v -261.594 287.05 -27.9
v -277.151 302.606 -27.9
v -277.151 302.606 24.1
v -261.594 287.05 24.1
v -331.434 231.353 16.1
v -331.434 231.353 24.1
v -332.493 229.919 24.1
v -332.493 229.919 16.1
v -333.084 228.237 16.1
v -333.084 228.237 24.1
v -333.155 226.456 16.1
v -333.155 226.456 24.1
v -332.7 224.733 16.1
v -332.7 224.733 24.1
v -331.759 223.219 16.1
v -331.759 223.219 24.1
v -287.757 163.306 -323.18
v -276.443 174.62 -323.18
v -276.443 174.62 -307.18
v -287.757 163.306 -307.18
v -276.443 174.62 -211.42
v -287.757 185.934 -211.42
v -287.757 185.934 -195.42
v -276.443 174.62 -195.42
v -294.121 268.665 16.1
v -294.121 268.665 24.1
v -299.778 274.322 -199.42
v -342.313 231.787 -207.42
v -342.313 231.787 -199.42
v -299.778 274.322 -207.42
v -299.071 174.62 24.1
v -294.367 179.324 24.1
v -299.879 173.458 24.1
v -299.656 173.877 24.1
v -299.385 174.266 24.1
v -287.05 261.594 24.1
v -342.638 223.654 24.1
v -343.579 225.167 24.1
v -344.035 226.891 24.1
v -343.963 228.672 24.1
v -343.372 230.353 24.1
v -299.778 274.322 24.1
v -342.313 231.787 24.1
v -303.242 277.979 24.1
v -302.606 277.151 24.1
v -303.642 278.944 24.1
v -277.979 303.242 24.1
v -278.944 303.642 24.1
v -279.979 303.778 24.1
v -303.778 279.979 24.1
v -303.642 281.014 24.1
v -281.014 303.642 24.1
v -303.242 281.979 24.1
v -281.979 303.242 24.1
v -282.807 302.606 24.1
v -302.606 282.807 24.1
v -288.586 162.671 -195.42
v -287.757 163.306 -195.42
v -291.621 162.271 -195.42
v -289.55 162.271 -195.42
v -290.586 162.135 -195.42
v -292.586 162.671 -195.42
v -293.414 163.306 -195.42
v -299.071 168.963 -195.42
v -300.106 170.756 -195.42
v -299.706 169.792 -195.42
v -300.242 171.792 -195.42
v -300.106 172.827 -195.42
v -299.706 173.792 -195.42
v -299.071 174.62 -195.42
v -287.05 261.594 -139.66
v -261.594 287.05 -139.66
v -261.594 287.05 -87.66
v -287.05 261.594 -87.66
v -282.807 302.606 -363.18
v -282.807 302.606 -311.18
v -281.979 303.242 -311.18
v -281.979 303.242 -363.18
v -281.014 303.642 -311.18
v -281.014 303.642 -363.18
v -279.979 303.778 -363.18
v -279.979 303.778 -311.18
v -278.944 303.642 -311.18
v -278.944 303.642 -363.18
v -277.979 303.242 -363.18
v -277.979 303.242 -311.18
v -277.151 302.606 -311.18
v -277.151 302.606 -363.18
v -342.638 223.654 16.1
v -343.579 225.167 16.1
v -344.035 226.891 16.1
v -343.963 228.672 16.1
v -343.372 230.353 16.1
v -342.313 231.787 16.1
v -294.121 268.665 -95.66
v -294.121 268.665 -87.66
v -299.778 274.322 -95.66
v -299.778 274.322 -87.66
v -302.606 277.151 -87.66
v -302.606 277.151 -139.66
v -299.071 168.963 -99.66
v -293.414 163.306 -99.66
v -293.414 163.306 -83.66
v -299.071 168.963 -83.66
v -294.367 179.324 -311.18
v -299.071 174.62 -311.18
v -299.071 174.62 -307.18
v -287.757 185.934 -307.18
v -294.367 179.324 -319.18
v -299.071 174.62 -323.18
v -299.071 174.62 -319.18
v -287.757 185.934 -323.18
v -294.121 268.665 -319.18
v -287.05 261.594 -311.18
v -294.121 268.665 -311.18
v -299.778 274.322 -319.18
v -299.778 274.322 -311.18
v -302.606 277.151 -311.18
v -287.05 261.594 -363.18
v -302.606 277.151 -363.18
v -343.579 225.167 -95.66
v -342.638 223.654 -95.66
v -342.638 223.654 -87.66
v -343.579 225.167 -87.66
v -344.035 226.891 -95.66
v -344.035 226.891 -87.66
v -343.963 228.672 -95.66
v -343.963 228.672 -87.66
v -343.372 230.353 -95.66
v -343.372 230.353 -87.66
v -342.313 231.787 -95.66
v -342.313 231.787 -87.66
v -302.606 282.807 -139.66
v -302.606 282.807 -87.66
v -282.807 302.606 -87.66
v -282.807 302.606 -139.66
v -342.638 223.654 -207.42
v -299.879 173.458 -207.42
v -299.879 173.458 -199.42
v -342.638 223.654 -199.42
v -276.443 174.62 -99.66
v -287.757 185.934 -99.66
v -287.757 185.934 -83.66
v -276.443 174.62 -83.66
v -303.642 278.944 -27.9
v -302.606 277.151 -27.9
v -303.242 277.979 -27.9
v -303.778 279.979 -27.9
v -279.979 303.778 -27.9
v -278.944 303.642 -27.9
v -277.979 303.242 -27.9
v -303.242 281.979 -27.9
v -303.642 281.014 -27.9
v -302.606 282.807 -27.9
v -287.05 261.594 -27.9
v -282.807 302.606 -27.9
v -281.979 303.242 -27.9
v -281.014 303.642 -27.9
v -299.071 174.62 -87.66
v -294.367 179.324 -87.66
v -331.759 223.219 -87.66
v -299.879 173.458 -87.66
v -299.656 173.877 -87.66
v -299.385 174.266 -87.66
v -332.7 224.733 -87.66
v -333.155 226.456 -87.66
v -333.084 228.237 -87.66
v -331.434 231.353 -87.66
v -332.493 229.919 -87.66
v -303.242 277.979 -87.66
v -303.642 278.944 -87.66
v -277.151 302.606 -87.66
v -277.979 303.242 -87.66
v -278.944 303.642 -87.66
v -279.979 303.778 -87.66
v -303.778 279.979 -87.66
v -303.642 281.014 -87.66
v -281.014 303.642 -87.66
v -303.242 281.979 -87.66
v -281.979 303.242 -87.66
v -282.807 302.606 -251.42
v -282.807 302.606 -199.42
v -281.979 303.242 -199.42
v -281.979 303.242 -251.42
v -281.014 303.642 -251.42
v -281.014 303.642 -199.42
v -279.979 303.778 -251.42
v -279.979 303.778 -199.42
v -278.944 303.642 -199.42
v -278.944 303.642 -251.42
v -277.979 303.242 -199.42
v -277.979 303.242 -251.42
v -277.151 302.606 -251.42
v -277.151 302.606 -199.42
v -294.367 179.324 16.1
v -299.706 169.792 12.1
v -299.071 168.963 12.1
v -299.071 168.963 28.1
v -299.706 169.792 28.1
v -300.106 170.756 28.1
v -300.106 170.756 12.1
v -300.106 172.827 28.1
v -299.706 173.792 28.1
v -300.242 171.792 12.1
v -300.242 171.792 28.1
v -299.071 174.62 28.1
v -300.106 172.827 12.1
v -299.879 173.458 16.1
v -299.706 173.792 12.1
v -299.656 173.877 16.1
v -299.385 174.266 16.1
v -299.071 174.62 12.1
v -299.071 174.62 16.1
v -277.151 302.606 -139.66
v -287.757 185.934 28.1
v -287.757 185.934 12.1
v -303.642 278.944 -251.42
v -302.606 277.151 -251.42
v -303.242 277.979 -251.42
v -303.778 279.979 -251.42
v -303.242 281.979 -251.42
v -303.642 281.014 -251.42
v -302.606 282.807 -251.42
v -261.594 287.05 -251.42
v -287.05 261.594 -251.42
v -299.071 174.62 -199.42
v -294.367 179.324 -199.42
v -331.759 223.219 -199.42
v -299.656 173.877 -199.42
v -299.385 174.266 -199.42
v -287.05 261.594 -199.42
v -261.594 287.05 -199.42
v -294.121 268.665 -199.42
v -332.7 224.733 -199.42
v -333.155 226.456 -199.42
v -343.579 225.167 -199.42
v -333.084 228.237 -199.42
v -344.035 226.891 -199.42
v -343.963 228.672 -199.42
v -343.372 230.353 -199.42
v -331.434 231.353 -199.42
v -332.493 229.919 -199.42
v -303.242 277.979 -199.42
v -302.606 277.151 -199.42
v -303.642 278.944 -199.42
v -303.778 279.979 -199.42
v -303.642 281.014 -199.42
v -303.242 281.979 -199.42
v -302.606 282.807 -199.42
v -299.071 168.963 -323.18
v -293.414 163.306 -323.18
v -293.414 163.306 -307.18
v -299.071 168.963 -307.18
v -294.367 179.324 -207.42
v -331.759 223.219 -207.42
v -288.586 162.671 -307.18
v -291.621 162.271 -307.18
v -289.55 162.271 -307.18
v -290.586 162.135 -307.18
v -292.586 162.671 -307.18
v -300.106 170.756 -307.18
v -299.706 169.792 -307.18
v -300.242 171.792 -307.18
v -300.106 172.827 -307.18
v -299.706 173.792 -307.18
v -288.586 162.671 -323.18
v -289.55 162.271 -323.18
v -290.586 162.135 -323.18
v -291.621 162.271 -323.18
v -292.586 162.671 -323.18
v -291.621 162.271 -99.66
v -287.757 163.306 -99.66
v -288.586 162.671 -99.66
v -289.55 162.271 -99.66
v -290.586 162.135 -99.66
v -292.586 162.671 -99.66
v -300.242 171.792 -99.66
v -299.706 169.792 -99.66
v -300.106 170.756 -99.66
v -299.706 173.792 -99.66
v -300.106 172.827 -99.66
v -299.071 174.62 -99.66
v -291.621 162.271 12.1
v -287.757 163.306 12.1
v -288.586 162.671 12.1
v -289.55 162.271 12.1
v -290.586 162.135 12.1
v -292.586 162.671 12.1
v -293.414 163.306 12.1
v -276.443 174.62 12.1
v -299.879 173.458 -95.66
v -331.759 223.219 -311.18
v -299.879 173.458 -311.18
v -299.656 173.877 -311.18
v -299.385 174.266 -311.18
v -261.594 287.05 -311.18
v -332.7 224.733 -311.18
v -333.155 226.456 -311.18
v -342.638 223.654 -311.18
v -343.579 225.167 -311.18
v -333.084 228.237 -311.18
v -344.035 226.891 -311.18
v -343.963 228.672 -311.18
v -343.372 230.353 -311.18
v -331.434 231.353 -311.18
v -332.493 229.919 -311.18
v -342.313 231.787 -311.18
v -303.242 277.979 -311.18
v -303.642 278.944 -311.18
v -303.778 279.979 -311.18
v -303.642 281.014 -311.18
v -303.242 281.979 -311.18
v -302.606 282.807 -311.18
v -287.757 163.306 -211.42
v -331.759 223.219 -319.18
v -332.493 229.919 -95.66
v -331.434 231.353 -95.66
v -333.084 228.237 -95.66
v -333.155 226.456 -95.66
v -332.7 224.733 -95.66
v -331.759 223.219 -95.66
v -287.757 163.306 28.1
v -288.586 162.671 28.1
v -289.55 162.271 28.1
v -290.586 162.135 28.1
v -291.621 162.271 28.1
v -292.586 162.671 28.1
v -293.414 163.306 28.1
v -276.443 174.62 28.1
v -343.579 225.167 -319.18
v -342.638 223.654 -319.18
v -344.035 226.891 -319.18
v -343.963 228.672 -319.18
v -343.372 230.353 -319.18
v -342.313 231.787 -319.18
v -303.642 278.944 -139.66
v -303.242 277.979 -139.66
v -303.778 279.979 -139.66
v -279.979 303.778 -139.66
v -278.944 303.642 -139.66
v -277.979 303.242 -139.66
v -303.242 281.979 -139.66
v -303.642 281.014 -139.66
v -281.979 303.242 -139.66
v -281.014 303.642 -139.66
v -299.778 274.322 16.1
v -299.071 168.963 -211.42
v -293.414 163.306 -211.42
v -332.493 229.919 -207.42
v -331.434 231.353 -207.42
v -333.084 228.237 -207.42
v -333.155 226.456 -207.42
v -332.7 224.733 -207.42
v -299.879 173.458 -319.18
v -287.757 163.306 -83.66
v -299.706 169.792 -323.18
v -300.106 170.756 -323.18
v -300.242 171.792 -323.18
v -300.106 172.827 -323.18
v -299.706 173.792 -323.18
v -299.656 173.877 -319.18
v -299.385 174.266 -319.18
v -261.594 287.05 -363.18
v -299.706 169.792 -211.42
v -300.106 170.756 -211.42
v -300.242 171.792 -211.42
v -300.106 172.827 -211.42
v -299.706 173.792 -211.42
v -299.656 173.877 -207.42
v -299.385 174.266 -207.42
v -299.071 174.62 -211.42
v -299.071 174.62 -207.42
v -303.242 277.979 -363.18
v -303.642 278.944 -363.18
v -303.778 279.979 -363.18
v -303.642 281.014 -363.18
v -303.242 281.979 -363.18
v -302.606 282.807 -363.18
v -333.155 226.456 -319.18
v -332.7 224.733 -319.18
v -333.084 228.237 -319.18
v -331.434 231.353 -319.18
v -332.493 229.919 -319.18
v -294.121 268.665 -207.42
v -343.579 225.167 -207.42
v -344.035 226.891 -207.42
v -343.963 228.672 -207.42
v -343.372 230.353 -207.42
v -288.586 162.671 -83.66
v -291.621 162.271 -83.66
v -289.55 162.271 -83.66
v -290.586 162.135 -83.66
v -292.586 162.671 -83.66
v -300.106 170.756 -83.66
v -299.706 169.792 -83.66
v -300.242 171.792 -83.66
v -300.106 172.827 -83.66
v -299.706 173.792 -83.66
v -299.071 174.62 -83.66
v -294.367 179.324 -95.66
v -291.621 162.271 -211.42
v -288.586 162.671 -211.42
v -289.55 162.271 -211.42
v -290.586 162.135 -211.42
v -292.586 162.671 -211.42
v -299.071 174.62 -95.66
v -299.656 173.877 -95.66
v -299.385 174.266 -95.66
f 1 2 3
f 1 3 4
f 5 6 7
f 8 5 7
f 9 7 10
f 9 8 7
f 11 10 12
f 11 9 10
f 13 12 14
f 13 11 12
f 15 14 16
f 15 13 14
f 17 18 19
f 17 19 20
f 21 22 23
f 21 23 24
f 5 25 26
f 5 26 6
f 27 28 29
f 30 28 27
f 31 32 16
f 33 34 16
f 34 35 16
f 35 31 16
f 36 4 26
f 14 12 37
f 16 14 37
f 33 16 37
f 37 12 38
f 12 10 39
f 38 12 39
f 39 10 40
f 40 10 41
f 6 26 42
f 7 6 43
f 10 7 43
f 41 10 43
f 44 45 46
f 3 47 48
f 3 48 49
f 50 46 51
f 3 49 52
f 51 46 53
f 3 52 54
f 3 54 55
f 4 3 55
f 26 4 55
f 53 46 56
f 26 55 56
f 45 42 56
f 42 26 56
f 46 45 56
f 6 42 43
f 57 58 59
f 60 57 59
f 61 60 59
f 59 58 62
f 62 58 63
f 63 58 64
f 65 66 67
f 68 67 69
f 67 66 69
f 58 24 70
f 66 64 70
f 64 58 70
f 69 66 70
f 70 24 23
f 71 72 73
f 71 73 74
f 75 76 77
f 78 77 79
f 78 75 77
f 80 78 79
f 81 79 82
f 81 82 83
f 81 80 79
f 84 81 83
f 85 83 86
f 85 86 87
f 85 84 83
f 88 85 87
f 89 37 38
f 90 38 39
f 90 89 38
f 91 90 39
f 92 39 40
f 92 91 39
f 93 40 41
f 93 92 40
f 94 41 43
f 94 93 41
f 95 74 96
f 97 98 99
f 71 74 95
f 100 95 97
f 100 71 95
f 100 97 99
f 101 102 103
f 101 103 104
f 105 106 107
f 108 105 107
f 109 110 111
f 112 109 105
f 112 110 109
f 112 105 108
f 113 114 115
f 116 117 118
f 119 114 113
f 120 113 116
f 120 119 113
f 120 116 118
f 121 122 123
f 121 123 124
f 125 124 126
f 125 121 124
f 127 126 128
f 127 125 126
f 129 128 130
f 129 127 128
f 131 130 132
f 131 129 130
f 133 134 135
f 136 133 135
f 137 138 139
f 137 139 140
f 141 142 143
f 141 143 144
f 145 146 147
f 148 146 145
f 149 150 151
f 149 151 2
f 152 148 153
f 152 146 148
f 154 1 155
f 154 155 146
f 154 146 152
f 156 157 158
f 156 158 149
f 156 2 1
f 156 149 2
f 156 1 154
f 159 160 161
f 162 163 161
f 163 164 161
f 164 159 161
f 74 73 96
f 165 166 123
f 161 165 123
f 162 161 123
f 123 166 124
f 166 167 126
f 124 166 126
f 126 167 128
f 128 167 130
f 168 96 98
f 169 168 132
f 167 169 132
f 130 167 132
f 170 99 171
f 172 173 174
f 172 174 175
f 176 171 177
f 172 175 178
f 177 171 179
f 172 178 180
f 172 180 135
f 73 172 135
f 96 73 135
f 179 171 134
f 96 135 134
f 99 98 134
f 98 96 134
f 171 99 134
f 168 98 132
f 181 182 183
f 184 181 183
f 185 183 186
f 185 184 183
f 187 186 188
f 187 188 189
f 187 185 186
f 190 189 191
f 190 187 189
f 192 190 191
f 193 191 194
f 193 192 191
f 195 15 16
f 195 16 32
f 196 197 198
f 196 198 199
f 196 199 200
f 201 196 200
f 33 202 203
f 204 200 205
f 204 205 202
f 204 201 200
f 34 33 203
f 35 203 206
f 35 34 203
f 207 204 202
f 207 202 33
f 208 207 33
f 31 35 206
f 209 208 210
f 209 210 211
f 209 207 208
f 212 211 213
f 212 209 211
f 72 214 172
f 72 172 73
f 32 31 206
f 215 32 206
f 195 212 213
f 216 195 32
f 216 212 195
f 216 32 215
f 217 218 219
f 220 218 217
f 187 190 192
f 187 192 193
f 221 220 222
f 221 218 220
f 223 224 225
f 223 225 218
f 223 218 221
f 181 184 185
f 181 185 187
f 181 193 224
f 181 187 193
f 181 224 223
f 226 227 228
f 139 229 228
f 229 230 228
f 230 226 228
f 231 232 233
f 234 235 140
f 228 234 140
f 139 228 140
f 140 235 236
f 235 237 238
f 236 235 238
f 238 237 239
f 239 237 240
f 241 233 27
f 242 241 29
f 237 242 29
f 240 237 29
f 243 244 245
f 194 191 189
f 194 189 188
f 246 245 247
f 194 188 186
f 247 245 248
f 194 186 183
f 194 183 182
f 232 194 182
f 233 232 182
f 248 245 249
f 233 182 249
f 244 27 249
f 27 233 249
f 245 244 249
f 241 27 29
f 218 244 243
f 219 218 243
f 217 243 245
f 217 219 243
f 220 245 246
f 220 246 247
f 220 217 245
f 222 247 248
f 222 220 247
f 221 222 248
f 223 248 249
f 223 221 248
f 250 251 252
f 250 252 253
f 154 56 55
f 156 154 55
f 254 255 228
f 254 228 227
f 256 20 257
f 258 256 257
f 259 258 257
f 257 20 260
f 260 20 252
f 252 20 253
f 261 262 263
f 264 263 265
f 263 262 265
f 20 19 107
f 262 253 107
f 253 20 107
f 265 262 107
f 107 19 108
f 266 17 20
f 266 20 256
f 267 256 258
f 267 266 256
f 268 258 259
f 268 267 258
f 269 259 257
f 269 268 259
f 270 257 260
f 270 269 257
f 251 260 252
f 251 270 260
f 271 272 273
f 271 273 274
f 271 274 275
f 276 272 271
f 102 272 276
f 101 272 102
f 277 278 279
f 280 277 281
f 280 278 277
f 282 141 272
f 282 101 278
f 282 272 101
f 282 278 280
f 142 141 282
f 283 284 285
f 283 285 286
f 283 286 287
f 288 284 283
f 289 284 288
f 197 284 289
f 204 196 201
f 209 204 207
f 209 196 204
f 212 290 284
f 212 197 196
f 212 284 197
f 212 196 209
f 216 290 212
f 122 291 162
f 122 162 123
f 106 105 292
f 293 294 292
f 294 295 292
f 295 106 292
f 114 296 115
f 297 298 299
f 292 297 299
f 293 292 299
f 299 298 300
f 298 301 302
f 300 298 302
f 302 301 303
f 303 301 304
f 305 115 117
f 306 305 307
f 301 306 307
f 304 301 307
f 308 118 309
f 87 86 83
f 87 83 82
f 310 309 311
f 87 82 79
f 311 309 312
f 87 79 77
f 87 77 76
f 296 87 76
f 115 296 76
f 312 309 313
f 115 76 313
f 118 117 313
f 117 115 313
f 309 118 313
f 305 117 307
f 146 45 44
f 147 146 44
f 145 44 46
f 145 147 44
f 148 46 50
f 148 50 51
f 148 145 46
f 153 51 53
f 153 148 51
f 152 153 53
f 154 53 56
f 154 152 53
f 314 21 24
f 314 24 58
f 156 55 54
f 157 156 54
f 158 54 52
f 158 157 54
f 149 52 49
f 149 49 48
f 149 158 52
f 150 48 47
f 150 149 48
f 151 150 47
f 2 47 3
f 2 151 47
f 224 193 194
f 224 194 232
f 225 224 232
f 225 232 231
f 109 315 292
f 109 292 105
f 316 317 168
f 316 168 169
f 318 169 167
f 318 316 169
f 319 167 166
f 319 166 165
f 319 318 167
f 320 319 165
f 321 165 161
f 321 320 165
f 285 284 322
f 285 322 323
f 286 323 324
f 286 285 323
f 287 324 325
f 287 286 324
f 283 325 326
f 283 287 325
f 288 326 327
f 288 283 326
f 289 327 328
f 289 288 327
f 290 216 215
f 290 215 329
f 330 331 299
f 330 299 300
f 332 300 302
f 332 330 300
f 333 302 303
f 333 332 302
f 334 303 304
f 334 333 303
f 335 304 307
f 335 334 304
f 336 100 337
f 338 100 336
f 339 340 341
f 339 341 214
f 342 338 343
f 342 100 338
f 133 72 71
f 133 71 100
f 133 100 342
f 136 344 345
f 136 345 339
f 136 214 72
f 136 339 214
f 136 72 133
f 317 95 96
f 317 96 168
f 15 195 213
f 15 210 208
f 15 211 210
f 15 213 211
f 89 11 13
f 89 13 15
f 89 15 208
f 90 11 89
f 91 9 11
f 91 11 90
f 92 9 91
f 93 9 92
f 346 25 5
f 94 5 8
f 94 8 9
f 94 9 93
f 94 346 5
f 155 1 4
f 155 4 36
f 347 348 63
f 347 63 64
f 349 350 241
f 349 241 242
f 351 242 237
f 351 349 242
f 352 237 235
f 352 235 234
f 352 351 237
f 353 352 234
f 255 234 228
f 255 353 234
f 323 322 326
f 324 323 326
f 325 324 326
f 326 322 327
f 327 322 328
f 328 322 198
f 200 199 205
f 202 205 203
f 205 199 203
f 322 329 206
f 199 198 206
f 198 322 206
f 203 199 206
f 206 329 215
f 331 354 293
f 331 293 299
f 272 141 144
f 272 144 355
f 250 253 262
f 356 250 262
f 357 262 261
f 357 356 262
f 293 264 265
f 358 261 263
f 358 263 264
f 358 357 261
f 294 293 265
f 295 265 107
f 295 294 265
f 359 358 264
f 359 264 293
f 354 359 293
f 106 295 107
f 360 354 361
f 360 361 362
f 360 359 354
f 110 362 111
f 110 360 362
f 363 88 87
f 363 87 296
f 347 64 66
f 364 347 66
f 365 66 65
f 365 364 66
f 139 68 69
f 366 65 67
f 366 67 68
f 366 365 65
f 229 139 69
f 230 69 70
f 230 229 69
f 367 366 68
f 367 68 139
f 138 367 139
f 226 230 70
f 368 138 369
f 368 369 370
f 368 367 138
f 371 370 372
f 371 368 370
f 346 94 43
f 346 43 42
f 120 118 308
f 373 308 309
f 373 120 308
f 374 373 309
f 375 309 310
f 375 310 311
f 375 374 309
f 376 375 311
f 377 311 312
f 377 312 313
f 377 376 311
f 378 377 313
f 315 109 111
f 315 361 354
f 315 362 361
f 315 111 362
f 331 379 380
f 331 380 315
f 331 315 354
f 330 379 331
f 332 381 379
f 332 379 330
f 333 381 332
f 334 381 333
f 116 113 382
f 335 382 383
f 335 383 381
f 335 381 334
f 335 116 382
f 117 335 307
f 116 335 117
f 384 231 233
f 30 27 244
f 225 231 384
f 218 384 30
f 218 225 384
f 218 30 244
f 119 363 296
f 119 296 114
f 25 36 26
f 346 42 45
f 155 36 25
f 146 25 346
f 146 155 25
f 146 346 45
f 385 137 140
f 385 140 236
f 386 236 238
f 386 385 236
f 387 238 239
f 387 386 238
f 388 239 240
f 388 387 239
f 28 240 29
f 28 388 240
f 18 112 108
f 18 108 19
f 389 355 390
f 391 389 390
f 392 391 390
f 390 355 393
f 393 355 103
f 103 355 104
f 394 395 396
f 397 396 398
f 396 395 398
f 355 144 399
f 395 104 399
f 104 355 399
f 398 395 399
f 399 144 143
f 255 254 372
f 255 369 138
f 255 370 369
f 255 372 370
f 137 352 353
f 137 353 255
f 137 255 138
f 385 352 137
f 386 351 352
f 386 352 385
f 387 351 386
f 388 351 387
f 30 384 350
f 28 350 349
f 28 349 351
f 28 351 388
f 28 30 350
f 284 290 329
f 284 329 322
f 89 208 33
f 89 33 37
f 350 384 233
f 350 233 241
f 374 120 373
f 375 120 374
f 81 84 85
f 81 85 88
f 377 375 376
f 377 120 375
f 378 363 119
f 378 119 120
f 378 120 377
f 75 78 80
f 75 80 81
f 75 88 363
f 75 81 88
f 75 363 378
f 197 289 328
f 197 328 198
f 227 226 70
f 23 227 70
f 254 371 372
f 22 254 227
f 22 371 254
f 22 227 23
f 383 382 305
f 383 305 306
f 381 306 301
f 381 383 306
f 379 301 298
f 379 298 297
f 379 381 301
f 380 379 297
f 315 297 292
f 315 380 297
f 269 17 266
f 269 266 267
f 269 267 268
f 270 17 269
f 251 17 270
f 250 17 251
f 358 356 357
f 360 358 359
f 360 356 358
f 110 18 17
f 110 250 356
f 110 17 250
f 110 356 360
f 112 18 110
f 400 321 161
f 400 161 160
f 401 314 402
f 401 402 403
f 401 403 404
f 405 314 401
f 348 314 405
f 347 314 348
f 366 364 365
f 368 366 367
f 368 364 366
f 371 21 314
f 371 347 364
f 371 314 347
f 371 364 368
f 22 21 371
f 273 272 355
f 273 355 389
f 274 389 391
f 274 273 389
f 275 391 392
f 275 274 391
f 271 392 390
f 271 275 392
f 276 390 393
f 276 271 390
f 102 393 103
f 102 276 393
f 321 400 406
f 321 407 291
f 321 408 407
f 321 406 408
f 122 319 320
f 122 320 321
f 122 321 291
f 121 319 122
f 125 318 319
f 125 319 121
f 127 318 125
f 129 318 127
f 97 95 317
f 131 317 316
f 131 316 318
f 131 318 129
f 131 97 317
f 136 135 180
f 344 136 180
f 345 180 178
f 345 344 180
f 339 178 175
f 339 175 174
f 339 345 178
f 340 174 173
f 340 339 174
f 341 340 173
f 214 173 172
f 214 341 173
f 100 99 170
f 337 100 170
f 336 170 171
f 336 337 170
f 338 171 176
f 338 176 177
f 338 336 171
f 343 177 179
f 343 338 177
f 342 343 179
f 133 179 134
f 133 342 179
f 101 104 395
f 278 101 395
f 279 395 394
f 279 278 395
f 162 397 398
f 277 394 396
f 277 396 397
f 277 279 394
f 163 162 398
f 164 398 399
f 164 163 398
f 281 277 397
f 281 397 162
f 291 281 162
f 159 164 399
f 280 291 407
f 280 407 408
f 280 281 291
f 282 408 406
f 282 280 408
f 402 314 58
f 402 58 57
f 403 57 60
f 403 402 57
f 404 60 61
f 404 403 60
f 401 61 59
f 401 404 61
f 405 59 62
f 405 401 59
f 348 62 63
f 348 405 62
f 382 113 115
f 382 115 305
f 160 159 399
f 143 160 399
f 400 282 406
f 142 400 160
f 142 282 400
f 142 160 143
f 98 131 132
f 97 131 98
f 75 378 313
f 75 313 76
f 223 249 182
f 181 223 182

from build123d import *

# Parameters (mm, degrees)
COIL_START        = -27.9
COIL_2_DEPTH      = 52
PLUG_START        = 16.1
PLUG_LEAD_2_DEPTH = 8
PLUG_START_2      = 12.1
PLUG_BOOT_2_DEPTH = 16
COIL_START_2      = -139.66
COIL_4_DEPTH      = 52
PLUG_START_3      = -95.66
PLUG_LEAD_4_DEPTH = 8
PLUG_START_4      = -99.66
PLUG_BOOT_4_DEPTH = 16
COIL_START_3      = -251.42
COIL_6_DEPTH      = 52
PLUG_START_5      = -207.42
PLUG_LEAD_6_DEPTH = 8
PLUG_START_6      = -211.42
PLUG_BOOT_6_DEPTH = 16
COIL_START_4      = -363.18
COIL_8_DEPTH      = 52
PLUG_START_7      = -319.18
PLUG_LEAD_8_DEPTH = 8
PLUG_START_8      = -323.18
PLUG_BOOT_8_DEPTH = 16


with BuildPart() as part:
    # Sketch1 → Coil 2 (new body)
    with BuildSketch(Plane.XY.offset(COIL_START)):
        with BuildLine():
            Line((-261.5941537, 287.049997823), (-287.049997823, 261.5941537))
            Line((-287.049997823, 261.5941537), (-302.606347009, 277.150502886))
            ThreePointArc((-302.606347009, 277.150502886), (-303.777919884, 279.978930011), (-302.606347009, 282.807357136))
            Line((-302.606347009, 282.807357136), (-282.807357136, 302.606347009))
            ThreePointArc((-282.807357136, 302.606347009), (-279.978930011, 303.777919884), (-277.150502886, 302.606347009))
            Line((-277.150502886, 302.606347009), (-261.5941537, 287.049997823))
        make_face()
    extrude(amount=COIL_2_DEPTH)

    # Sketch2 → Plug Lead 2 (add)
    with BuildSketch(Plane.XY.offset(PLUG_START)):
        with BuildLine():
            Line((-288.464211385, 274.322075761), (-331.433712353, 231.352574794))
            ThreePointArc((-331.433712353, 231.352574794), (-333.18629268, 227.349360476), (-331.758531048, 223.219135373))
            Line((-331.758531048, 223.219135373), (-288.954772369, 172.971244749))
            Line((-288.954772369, 172.971244749), (-295.044718213, 167.783513104))
            Line((-295.044718213, 167.783513104), (-342.63776427, 223.65361065))
            ThreePointArc((-342.63776427, 223.65361065), (-344.065525902, 227.783835753), (-342.312945575, 231.787050071))
            Line((-342.312945575, 231.787050071), (-294.121065635, 279.978930011))
            Line((-294.121065635, 279.978930011), (-288.464211385, 274.322075761))
        make_face()
    extrude(amount=PLUG_LEAD_2_DEPTH)

    # Sketch3 → Plug Boot 2 (add)
    with BuildSketch(Plane.XY.offset(PLUG_START_2)):
        with BuildLine():
            Line((-276.443396105, 174.620019614), (-287.757104604, 163.306311115))
            ThreePointArc((-287.757104604, 163.306311115), (-290.585531729, 162.13473824), (-293.413958853, 163.306311115))
            Line((-293.413958853, 163.306311115), (-299.070813103, 168.963165365))
            ThreePointArc((-299.070813103, 168.963165365), (-300.242385978, 171.791592489), (-299.070813103, 174.620019614))
            Line((-299.070813103, 174.620019614), (-287.757104604, 185.933728113))
            Line((-287.757104604, 185.933728113), (-276.443396105, 174.620019614))
        make_face()
    extrude(amount=PLUG_BOOT_2_DEPTH)


with BuildPart() as body_2:
    # Sketch4 → Coil 4 (new body)
    with BuildSketch(Plane.XY.offset(COIL_START_2)):
        with BuildLine():
            Line((-261.5941537, 287.049997823), (-287.049997823, 261.5941537))
            Line((-287.049997823, 261.5941537), (-302.606347009, 277.150502886))
            ThreePointArc((-302.606347009, 277.150502886), (-303.777919884, 279.978930011), (-302.606347009, 282.807357136))
            Line((-302.606347009, 282.807357136), (-282.807357136, 302.606347009))
            ThreePointArc((-282.807357136, 302.606347009), (-279.978930011, 303.777919884), (-277.150502886, 302.606347009))
            Line((-277.150502886, 302.606347009), (-261.5941537, 287.049997823))
        make_face()
    extrude(amount=COIL_4_DEPTH)

    # Sketch5 → Plug Lead 4 (add)
    with BuildSketch(Plane.XY.offset(PLUG_START_3)):
        with BuildLine():
            Line((-288.464211385, 274.322075761), (-331.433712353, 231.352574794))
            ThreePointArc((-331.433712353, 231.352574794), (-333.18629268, 227.349360476), (-331.758531048, 223.219135373))
            Line((-331.758531048, 223.219135373), (-288.954772369, 172.971244749))
            Line((-288.954772369, 172.971244749), (-295.044718213, 167.783513104))
            Line((-295.044718213, 167.783513104), (-342.63776427, 223.65361065))
            ThreePointArc((-342.63776427, 223.65361065), (-344.065525902, 227.783835753), (-342.312945575, 231.787050071))
            Line((-342.312945575, 231.787050071), (-294.121065635, 279.978930011))
            Line((-294.121065635, 279.978930011), (-288.464211385, 274.322075761))
        make_face()
    extrude(amount=PLUG_LEAD_4_DEPTH)

    # Sketch6 → Plug Boot 4 (add)
    with BuildSketch(Plane.XY.offset(PLUG_START_4)):
        with BuildLine():
            Line((-276.443396105, 174.620019614), (-287.757104604, 163.306311115))
            ThreePointArc((-287.757104604, 163.306311115), (-290.585531729, 162.13473824), (-293.413958853, 163.306311115))
            Line((-293.413958853, 163.306311115), (-299.070813103, 168.963165365))
            ThreePointArc((-299.070813103, 168.963165365), (-300.242385978, 171.791592489), (-299.070813103, 174.620019614))
            Line((-299.070813103, 174.620019614), (-287.757104604, 185.933728113))
            Line((-287.757104604, 185.933728113), (-276.443396105, 174.620019614))
        make_face()
    extrude(amount=PLUG_BOOT_4_DEPTH)


with BuildPart() as body_3:
    # Sketch7 → Coil 6 (new body)
    with BuildSketch(Plane.XY.offset(COIL_START_3)):
        with BuildLine():
            Line((-261.5941537, 287.049997823), (-287.049997823, 261.5941537))
            Line((-287.049997823, 261.5941537), (-302.606347009, 277.150502886))
            ThreePointArc((-302.606347009, 277.150502886), (-303.777919884, 279.978930011), (-302.606347009, 282.807357136))
            Line((-302.606347009, 282.807357136), (-282.807357136, 302.606347009))
            ThreePointArc((-282.807357136, 302.606347009), (-279.978930011, 303.777919884), (-277.150502886, 302.606347009))
            Line((-277.150502886, 302.606347009), (-261.5941537, 287.049997823))
        make_face()
    extrude(amount=COIL_6_DEPTH)

    # Sketch8 → Plug Lead 6 (add)
    with BuildSketch(Plane.XY.offset(PLUG_START_5)):
        with BuildLine():
            Line((-288.464211385, 274.322075761), (-331.433712353, 231.352574794))
            ThreePointArc((-331.433712353, 231.352574794), (-333.18629268, 227.349360476), (-331.758531048, 223.219135373))
            Line((-331.758531048, 223.219135373), (-288.954772369, 172.971244749))
            Line((-288.954772369, 172.971244749), (-295.044718213, 167.783513104))
            Line((-295.044718213, 167.783513104), (-342.63776427, 223.65361065))
            ThreePointArc((-342.63776427, 223.65361065), (-344.065525902, 227.783835753), (-342.312945575, 231.787050071))
            Line((-342.312945575, 231.787050071), (-294.121065635, 279.978930011))
            Line((-294.121065635, 279.978930011), (-288.464211385, 274.322075761))
        make_face()
    extrude(amount=PLUG_LEAD_6_DEPTH)

    # Sketch9 → Plug Boot 6 (add)
    with BuildSketch(Plane.XY.offset(PLUG_START_6)):
        with BuildLine():
            Line((-276.443396105, 174.620019614), (-287.757104604, 163.306311115))
            ThreePointArc((-287.757104604, 163.306311115), (-290.585531729, 162.13473824), (-293.413958853, 163.306311115))
            Line((-293.413958853, 163.306311115), (-299.070813103, 168.963165365))
            ThreePointArc((-299.070813103, 168.963165365), (-300.242385978, 171.791592489), (-299.070813103, 174.620019614))
            Line((-299.070813103, 174.620019614), (-287.757104604, 185.933728113))
            Line((-287.757104604, 185.933728113), (-276.443396105, 174.620019614))
        make_face()
    extrude(amount=PLUG_BOOT_6_DEPTH)


with BuildPart() as body_4:
    # Sketch10 → Coil 8 (new body)
    with BuildSketch(Plane.XY.offset(COIL_START_4)):
        with BuildLine():
            Line((-261.5941537, 287.049997823), (-287.049997823, 261.5941537))
            Line((-287.049997823, 261.5941537), (-302.606347009, 277.150502886))
            ThreePointArc((-302.606347009, 277.150502886), (-303.777919884, 279.978930011), (-302.606347009, 282.807357136))
            Line((-302.606347009, 282.807357136), (-282.807357136, 302.606347009))
            ThreePointArc((-282.807357136, 302.606347009), (-279.978930011, 303.777919884), (-277.150502886, 302.606347009))
            Line((-277.150502886, 302.606347009), (-261.5941537, 287.049997823))
        make_face()
    extrude(amount=COIL_8_DEPTH)

    # Sketch11 → Plug Lead 8 (add)
    with BuildSketch(Plane.XY.offset(PLUG_START_7)):
        with BuildLine():
            Line((-288.464211385, 274.322075761), (-331.433712353, 231.352574794))
            ThreePointArc((-331.433712353, 231.352574794), (-333.18629268, 227.349360476), (-331.758531048, 223.219135373))
            Line((-331.758531048, 223.219135373), (-288.954772369, 172.971244749))
            Line((-288.954772369, 172.971244749), (-295.044718213, 167.783513104))
            Line((-295.044718213, 167.783513104), (-342.63776427, 223.65361065))
            ThreePointArc((-342.63776427, 223.65361065), (-344.065525902, 227.783835753), (-342.312945575, 231.787050071))
            Line((-342.312945575, 231.787050071), (-294.121065635, 279.978930011))
            Line((-294.121065635, 279.978930011), (-288.464211385, 274.322075761))
        make_face()
    extrude(amount=PLUG_LEAD_8_DEPTH)

    # Sketch12 → Plug Boot 8 (add)
    with BuildSketch(Plane.XY.offset(PLUG_START_8)):
        with BuildLine():
            Line((-276.443396105, 174.620019614), (-287.757104604, 163.306311115))
            ThreePointArc((-287.757104604, 163.306311115), (-290.585531729, 162.13473824), (-293.413958853, 163.306311115))
            Line((-293.413958853, 163.306311115), (-299.070813103, 168.963165365))
            ThreePointArc((-299.070813103, 168.963165365), (-300.242385978, 171.791592489), (-299.070813103, 174.620019614))
            Line((-299.070813103, 174.620019614), (-287.757104604, 185.933728113))
            Line((-287.757104604, 185.933728113), (-276.443396105, 174.620019614))
        make_face()
    extrude(amount=PLUG_BOOT_8_DEPTH)


solid = Compound([part.part, body_2.part, body_3.part, body_4.part])
